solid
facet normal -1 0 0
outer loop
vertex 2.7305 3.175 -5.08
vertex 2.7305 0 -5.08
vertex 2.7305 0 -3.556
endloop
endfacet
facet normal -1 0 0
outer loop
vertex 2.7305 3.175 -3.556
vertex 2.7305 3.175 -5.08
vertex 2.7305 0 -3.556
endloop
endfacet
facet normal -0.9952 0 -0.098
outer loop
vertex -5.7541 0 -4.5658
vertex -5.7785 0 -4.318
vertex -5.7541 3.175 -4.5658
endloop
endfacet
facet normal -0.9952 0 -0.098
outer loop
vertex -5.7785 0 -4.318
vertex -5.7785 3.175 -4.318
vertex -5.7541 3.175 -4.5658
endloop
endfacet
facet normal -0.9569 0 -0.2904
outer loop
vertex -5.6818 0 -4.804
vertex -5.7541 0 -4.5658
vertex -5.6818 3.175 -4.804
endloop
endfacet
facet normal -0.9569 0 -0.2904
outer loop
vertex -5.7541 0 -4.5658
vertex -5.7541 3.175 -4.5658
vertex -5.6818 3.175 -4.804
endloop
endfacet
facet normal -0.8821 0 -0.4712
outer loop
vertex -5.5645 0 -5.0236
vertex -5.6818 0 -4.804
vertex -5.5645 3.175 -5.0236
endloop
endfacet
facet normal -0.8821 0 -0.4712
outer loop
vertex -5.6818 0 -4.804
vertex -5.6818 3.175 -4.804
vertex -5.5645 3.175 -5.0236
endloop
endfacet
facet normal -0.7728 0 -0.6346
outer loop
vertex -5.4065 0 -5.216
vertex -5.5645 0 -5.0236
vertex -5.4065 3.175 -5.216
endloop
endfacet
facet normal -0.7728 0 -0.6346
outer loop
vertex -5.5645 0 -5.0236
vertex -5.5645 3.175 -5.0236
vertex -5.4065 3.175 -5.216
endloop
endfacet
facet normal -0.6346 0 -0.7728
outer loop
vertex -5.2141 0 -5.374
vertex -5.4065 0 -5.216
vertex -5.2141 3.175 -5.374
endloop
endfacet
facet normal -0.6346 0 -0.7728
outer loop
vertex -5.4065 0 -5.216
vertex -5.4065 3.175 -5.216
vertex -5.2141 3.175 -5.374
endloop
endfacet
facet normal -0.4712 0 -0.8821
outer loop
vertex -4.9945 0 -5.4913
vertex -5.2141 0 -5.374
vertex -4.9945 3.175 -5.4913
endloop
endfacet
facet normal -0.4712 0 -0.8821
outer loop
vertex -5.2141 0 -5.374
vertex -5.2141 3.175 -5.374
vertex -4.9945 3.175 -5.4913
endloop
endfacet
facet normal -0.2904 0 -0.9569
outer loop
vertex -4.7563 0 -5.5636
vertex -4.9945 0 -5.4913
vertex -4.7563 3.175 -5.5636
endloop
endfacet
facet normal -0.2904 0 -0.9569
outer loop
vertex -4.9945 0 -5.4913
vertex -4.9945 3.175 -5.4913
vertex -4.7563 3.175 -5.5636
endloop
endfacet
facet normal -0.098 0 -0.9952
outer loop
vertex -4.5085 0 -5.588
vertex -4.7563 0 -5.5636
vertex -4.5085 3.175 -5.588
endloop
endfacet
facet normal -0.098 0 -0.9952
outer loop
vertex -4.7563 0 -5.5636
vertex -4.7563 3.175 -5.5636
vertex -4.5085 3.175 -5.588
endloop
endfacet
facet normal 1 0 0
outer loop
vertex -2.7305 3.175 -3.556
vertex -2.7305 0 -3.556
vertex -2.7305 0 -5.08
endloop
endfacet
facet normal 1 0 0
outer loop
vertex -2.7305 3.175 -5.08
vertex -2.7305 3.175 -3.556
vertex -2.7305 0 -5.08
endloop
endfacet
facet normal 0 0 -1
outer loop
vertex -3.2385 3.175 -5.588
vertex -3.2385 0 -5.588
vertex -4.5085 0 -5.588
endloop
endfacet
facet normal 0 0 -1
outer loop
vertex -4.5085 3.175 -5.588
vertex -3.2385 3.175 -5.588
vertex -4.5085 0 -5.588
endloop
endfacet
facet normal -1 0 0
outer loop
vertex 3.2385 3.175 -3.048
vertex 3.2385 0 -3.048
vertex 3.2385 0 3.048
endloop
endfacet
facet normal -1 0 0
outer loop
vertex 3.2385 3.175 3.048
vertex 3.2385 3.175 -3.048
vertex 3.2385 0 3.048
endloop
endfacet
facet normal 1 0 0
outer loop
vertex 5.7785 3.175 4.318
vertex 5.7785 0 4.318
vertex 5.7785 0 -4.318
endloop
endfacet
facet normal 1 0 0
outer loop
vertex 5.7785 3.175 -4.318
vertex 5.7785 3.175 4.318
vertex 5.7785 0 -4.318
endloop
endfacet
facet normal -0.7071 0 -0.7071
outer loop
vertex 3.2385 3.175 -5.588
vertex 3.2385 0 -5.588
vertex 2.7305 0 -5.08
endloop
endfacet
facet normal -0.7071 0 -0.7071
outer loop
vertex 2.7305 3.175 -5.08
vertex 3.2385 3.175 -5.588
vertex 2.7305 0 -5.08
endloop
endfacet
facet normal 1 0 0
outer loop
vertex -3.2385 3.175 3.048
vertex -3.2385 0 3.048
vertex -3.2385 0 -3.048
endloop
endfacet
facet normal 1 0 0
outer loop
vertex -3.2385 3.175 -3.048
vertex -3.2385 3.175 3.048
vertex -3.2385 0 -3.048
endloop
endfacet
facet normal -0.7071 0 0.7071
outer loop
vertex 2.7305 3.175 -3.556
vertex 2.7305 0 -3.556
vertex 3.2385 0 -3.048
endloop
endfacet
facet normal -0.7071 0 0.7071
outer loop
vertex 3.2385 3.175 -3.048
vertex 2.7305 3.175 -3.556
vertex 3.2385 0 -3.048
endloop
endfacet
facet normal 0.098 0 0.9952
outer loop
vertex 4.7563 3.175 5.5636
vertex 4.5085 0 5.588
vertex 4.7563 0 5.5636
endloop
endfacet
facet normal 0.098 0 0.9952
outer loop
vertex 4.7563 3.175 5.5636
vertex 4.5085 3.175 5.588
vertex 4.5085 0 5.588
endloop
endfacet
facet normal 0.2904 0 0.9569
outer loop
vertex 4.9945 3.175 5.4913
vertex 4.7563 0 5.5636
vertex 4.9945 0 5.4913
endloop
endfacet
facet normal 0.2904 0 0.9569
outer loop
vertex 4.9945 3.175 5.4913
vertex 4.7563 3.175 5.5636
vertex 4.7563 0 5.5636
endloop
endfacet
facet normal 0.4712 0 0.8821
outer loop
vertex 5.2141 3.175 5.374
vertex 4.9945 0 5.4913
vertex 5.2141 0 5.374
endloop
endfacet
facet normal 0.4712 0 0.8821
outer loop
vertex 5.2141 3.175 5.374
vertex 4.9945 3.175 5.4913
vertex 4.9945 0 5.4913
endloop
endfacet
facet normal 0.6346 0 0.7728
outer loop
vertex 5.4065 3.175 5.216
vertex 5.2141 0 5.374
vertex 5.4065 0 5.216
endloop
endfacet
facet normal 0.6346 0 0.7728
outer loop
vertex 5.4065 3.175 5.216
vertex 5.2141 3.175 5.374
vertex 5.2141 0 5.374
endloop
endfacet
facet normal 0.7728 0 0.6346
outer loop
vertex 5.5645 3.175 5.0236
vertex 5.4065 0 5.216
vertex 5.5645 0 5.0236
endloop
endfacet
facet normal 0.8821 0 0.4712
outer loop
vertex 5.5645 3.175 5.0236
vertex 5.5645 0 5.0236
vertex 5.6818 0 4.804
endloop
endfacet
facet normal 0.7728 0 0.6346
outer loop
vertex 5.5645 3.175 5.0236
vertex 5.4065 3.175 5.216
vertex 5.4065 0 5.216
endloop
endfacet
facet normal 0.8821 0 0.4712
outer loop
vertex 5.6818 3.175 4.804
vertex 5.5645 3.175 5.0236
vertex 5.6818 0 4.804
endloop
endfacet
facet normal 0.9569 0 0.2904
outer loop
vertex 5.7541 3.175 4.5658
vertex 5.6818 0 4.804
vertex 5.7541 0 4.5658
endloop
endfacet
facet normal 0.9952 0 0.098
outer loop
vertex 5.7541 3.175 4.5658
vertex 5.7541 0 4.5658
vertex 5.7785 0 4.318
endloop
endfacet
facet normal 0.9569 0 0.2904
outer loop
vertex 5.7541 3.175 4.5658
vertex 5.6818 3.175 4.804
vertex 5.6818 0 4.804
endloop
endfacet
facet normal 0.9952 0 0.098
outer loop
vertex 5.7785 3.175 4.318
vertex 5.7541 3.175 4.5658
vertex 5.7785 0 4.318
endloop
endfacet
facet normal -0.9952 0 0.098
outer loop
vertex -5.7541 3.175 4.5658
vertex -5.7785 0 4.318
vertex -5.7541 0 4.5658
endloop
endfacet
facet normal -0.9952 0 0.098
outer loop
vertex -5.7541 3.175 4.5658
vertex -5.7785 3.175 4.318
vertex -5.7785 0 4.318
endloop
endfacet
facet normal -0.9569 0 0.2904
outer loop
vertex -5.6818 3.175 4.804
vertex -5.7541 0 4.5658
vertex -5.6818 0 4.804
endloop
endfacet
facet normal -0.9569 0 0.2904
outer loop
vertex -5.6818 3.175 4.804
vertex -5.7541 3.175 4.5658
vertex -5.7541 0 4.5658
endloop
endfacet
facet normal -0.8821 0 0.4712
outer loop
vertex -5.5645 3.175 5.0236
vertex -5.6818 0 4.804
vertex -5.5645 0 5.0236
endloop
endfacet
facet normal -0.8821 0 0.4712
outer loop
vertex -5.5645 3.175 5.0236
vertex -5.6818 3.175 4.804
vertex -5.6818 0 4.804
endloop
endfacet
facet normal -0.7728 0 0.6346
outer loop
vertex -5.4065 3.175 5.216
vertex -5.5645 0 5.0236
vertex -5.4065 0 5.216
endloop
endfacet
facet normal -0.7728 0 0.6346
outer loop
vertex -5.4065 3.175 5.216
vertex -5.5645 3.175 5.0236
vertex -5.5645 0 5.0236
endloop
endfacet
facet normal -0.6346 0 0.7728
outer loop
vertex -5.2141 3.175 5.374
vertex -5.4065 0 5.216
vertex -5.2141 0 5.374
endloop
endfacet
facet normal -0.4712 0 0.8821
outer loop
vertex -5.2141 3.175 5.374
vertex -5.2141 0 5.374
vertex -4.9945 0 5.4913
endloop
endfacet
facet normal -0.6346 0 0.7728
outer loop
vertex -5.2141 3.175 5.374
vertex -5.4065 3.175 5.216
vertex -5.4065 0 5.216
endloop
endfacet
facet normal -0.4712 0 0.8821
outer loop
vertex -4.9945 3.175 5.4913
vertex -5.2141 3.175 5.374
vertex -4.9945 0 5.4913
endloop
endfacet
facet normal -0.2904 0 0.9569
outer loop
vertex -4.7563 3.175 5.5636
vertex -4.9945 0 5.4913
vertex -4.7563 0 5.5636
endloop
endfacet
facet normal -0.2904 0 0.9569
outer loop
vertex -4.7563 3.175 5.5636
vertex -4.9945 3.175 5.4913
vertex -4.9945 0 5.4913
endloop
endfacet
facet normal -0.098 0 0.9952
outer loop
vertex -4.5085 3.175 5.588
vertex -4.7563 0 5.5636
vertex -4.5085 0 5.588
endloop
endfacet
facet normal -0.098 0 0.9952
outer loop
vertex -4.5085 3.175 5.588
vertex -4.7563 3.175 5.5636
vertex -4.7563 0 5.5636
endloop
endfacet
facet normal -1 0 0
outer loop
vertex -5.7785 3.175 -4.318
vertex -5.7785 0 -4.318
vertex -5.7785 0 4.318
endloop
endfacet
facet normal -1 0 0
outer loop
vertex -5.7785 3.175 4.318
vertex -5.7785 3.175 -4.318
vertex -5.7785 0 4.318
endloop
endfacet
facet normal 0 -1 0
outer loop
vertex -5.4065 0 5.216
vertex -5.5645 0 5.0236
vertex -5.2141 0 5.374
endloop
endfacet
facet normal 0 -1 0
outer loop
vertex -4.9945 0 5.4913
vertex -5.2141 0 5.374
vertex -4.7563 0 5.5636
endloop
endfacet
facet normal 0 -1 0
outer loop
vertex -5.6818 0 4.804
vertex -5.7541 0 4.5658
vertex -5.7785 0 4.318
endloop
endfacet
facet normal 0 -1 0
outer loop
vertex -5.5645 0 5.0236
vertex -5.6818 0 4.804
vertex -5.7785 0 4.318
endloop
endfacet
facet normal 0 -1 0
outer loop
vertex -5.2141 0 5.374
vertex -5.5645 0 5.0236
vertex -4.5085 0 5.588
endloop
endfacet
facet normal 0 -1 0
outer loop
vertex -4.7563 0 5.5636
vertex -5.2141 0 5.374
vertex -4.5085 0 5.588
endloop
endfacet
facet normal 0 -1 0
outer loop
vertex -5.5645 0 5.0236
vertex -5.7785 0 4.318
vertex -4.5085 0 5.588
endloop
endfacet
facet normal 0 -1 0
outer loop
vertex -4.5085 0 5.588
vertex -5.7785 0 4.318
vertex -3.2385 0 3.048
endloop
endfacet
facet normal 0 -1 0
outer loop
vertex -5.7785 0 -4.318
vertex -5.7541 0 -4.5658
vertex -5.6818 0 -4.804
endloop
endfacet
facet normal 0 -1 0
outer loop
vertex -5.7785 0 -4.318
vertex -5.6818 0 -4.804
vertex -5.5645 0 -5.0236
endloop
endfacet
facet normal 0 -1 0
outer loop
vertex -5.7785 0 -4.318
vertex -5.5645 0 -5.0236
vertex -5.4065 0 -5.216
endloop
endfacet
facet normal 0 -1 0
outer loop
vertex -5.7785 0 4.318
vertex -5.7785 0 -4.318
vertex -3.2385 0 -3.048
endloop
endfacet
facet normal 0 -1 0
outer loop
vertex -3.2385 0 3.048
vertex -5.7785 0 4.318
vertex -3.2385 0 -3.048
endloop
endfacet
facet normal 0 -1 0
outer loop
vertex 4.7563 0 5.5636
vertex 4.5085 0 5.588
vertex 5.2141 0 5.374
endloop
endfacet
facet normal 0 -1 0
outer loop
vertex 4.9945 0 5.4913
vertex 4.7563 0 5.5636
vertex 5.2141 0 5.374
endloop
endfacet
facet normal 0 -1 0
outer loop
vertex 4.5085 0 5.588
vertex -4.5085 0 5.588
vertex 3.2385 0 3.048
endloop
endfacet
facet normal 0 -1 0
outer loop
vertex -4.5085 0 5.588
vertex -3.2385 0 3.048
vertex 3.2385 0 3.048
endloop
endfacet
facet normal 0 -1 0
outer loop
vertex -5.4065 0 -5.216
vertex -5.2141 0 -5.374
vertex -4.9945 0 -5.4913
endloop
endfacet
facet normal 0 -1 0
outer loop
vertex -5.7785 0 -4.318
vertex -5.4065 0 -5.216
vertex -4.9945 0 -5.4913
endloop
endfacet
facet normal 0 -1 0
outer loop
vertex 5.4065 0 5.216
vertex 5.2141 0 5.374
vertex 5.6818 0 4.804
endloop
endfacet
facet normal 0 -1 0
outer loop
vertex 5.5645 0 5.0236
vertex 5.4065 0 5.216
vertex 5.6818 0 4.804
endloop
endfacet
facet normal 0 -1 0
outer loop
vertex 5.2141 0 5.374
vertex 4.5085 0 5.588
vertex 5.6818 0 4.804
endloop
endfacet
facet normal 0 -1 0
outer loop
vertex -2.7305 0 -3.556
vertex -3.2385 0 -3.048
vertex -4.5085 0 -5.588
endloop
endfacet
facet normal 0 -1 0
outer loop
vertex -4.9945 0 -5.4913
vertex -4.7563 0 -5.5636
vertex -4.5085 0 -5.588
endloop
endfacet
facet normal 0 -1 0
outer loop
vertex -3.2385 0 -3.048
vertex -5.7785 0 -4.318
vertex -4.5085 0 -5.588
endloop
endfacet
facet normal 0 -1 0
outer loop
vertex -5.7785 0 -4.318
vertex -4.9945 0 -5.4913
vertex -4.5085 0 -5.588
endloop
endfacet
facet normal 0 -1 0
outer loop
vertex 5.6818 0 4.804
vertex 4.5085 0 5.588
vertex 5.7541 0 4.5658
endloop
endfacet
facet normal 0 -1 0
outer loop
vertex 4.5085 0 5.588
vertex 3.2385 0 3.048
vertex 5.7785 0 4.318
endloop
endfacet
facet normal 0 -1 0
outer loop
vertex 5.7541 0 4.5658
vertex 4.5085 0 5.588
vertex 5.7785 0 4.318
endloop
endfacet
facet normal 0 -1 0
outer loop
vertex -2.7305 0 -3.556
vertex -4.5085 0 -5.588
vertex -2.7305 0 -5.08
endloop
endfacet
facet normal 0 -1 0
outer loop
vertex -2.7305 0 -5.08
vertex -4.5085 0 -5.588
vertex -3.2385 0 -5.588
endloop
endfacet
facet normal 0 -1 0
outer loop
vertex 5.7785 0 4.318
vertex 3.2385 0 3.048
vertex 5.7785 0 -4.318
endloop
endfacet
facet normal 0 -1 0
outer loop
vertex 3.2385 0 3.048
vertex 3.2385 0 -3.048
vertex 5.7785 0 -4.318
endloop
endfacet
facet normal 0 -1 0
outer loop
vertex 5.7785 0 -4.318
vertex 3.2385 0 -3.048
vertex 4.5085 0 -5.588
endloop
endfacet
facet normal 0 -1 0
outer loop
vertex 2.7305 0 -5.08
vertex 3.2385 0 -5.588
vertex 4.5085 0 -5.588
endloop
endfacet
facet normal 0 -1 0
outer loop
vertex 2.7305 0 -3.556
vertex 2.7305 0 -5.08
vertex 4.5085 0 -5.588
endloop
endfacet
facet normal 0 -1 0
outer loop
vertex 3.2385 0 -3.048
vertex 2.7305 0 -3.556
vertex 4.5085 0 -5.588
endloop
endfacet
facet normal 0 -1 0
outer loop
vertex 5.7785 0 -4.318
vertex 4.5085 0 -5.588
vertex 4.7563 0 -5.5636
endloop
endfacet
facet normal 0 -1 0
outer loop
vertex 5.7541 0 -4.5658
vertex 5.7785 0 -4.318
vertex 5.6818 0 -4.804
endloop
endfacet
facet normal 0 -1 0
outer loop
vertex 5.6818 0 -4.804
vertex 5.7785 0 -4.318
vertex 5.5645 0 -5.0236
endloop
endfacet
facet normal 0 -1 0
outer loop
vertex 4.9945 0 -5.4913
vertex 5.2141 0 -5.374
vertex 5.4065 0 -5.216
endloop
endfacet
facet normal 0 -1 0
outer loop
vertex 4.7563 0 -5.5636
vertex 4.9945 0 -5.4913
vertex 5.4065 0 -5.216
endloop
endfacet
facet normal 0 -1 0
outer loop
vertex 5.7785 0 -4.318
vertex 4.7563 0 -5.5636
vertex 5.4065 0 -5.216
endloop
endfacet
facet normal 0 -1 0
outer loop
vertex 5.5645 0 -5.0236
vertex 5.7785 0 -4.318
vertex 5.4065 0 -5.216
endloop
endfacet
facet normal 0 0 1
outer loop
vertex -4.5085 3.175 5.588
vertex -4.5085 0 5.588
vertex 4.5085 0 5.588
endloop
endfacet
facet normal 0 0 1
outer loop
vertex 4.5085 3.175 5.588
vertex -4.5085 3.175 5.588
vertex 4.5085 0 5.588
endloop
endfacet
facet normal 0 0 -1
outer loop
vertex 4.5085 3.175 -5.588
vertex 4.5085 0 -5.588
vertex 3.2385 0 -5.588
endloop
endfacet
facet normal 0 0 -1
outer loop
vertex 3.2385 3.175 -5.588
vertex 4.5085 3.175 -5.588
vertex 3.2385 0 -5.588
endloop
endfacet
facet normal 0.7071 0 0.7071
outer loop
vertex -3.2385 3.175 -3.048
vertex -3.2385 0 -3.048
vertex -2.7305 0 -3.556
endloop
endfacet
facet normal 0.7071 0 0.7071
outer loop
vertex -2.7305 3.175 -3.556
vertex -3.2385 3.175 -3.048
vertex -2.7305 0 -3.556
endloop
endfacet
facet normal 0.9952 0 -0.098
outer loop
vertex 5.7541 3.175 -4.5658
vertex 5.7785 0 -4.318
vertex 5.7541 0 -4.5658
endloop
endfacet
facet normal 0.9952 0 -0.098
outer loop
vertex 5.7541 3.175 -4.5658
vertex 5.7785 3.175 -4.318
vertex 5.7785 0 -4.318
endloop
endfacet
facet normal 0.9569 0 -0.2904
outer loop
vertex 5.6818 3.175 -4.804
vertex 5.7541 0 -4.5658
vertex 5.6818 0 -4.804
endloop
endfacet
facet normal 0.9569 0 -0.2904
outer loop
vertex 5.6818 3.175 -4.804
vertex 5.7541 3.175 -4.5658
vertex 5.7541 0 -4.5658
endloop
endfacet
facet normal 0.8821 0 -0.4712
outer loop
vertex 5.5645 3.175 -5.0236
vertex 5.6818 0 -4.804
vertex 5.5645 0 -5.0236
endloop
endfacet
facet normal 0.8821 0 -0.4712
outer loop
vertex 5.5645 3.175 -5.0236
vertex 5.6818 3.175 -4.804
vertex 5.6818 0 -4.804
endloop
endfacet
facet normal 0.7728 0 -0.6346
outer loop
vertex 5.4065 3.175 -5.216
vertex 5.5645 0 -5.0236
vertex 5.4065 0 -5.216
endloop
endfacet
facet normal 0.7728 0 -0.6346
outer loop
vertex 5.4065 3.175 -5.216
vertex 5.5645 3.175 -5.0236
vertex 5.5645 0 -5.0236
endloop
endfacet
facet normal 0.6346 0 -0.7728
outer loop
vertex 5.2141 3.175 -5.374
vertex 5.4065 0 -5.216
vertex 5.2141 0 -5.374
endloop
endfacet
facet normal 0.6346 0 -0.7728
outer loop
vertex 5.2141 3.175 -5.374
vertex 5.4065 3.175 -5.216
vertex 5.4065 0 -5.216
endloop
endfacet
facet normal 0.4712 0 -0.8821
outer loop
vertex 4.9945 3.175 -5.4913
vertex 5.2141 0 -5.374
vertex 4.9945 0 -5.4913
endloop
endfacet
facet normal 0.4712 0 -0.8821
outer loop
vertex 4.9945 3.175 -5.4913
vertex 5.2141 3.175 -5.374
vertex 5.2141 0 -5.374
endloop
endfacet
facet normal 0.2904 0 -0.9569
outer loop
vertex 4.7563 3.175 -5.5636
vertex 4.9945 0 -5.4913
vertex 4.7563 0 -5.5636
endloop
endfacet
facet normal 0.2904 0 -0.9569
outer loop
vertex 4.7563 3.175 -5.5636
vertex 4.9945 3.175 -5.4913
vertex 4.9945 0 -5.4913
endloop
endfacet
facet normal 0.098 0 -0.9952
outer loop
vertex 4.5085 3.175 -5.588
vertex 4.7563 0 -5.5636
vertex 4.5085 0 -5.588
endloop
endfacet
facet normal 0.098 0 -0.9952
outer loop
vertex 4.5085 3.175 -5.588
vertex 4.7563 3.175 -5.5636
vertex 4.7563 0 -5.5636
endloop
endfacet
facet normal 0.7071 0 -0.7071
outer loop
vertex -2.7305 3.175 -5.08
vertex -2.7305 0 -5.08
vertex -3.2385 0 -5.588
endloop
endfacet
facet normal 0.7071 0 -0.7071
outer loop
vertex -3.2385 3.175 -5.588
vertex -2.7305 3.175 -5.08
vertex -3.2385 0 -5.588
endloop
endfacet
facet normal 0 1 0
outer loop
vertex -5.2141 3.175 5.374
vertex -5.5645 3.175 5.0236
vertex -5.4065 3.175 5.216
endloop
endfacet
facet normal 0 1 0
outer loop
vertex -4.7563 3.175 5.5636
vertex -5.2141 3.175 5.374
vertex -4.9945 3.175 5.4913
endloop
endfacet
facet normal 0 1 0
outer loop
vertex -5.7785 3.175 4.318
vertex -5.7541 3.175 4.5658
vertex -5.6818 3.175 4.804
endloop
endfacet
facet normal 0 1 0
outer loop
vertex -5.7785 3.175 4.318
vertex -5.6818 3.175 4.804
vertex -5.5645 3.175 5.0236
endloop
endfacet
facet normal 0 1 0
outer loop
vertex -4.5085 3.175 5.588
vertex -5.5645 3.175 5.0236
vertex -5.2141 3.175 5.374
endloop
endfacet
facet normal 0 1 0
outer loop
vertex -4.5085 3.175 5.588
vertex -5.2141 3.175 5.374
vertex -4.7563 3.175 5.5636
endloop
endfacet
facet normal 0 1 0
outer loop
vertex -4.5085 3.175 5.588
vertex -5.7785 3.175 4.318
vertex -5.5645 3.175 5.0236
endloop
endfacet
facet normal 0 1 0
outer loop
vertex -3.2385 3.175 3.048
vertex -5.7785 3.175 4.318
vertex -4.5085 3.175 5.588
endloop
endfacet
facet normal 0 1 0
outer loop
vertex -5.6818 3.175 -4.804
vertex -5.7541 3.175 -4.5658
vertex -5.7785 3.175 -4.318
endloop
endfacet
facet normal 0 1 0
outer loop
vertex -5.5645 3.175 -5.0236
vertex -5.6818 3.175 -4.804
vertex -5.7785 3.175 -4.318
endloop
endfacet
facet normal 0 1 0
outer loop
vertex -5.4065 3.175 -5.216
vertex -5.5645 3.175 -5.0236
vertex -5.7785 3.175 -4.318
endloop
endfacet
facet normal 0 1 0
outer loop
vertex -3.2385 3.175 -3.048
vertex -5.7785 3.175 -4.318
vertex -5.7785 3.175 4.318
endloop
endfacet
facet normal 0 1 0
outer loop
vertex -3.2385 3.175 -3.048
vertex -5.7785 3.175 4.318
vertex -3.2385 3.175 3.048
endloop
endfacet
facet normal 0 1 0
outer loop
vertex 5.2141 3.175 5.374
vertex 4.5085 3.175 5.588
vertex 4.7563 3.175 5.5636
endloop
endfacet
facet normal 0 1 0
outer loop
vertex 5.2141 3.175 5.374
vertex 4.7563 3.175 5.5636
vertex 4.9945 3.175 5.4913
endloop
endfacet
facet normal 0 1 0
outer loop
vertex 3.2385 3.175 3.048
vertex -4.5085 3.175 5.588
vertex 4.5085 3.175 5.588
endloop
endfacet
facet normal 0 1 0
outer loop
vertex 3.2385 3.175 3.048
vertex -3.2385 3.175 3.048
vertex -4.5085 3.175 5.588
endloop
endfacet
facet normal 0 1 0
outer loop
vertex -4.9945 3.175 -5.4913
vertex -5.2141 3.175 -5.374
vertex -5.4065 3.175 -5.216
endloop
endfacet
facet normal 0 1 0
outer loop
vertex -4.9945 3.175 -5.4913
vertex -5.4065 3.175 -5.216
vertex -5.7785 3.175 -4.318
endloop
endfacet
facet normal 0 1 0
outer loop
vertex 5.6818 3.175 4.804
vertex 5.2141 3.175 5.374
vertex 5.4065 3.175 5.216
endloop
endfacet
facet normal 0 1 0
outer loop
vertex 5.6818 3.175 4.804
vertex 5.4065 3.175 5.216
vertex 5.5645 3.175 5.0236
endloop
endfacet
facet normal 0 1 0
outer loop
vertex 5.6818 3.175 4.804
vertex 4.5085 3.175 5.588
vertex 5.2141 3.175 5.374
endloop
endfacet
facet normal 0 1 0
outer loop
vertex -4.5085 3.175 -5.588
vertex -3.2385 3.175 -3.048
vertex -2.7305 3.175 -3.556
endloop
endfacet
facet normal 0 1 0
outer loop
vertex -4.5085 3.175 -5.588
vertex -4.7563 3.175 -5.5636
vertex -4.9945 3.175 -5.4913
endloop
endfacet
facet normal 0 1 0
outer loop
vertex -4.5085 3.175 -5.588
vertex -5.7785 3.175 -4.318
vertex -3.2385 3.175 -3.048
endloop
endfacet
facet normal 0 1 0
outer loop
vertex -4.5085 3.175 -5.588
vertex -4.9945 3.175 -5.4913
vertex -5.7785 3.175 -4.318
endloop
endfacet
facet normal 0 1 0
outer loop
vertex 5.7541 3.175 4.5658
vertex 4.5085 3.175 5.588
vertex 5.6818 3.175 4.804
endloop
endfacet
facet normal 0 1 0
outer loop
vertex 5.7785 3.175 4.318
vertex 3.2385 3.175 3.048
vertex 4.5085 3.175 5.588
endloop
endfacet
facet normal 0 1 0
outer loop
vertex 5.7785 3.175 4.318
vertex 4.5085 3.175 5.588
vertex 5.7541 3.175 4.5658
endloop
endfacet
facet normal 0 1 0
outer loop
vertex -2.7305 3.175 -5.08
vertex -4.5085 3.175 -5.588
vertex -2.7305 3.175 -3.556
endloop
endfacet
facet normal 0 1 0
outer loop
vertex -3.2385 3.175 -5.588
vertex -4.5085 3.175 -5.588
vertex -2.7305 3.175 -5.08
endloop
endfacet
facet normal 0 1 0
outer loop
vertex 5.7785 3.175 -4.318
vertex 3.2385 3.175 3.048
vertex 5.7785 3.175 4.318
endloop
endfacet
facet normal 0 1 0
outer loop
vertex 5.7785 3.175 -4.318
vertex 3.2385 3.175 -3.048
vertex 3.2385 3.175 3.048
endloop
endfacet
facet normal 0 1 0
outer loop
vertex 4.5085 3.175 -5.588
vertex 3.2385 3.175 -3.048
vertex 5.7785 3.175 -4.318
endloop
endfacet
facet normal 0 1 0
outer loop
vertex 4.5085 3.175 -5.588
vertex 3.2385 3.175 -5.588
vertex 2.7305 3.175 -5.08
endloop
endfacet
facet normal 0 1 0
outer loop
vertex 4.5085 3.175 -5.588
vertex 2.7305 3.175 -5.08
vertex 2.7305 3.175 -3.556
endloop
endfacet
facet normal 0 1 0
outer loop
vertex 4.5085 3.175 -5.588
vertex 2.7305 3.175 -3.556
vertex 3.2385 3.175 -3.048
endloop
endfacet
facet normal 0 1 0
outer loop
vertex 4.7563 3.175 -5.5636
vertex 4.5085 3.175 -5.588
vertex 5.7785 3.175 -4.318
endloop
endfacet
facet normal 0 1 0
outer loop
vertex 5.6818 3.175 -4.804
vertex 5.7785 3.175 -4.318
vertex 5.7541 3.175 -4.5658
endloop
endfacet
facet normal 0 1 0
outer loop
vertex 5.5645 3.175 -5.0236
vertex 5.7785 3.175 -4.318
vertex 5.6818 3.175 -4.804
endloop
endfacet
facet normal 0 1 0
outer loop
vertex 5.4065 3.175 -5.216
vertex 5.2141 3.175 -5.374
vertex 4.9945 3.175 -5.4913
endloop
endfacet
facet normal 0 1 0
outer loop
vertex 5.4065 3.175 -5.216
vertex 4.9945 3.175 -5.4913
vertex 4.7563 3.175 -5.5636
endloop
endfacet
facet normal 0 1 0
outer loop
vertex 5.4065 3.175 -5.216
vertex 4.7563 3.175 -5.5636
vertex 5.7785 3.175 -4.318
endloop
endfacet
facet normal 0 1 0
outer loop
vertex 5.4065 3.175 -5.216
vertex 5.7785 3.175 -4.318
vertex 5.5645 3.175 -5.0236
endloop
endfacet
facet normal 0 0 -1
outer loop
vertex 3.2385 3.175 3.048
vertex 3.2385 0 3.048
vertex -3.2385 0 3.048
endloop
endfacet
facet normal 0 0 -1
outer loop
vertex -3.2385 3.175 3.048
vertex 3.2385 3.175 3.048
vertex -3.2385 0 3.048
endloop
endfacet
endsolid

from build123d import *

# Parameters (mm, degrees)
BOSS_EXTRUDE1_DEPTH = 3.175
FILLET1_R           = 1.27


with BuildPart() as part:
    # Sketch1 → Boss-Extrude1 (new body)
    with BuildSketch(Plane(origin=(0, 0, 0), x_dir=(1, 0, 0), z_dir=(0, 1, 0))):
        Polygon((-5.7785, 5.588), (-5.7785, -5.588), (5.7785, -5.588), (5.7785, 5.588), (3.2385, 5.588), (2.7305, 5.08), (2.7305, 3.556), (3.2385, 3.048), (3.2385, -3.048), (-3.2385, -3.048), (-3.2385, 3.048), (-2.7305, 3.556), (-2.7305, 5.08), (-3.2385, 5.588), align=None)
    extrude(amount=BOSS_EXTRUDE1_DEPTH)

    # Fillet1
    fillet1_edges = [part.edges().sort_by_distance(p)[0] for p in [
        (5.7785, 1.5875, -5.588),
        (5.7785, 1.5875, 5.588),
        (-5.7785, 1.5875, 5.588),
        (-5.7785, 1.5875, -5.588),
    ]]
    fillet(fillet1_edges, radius=FILLET1_R)


solid = part.part
